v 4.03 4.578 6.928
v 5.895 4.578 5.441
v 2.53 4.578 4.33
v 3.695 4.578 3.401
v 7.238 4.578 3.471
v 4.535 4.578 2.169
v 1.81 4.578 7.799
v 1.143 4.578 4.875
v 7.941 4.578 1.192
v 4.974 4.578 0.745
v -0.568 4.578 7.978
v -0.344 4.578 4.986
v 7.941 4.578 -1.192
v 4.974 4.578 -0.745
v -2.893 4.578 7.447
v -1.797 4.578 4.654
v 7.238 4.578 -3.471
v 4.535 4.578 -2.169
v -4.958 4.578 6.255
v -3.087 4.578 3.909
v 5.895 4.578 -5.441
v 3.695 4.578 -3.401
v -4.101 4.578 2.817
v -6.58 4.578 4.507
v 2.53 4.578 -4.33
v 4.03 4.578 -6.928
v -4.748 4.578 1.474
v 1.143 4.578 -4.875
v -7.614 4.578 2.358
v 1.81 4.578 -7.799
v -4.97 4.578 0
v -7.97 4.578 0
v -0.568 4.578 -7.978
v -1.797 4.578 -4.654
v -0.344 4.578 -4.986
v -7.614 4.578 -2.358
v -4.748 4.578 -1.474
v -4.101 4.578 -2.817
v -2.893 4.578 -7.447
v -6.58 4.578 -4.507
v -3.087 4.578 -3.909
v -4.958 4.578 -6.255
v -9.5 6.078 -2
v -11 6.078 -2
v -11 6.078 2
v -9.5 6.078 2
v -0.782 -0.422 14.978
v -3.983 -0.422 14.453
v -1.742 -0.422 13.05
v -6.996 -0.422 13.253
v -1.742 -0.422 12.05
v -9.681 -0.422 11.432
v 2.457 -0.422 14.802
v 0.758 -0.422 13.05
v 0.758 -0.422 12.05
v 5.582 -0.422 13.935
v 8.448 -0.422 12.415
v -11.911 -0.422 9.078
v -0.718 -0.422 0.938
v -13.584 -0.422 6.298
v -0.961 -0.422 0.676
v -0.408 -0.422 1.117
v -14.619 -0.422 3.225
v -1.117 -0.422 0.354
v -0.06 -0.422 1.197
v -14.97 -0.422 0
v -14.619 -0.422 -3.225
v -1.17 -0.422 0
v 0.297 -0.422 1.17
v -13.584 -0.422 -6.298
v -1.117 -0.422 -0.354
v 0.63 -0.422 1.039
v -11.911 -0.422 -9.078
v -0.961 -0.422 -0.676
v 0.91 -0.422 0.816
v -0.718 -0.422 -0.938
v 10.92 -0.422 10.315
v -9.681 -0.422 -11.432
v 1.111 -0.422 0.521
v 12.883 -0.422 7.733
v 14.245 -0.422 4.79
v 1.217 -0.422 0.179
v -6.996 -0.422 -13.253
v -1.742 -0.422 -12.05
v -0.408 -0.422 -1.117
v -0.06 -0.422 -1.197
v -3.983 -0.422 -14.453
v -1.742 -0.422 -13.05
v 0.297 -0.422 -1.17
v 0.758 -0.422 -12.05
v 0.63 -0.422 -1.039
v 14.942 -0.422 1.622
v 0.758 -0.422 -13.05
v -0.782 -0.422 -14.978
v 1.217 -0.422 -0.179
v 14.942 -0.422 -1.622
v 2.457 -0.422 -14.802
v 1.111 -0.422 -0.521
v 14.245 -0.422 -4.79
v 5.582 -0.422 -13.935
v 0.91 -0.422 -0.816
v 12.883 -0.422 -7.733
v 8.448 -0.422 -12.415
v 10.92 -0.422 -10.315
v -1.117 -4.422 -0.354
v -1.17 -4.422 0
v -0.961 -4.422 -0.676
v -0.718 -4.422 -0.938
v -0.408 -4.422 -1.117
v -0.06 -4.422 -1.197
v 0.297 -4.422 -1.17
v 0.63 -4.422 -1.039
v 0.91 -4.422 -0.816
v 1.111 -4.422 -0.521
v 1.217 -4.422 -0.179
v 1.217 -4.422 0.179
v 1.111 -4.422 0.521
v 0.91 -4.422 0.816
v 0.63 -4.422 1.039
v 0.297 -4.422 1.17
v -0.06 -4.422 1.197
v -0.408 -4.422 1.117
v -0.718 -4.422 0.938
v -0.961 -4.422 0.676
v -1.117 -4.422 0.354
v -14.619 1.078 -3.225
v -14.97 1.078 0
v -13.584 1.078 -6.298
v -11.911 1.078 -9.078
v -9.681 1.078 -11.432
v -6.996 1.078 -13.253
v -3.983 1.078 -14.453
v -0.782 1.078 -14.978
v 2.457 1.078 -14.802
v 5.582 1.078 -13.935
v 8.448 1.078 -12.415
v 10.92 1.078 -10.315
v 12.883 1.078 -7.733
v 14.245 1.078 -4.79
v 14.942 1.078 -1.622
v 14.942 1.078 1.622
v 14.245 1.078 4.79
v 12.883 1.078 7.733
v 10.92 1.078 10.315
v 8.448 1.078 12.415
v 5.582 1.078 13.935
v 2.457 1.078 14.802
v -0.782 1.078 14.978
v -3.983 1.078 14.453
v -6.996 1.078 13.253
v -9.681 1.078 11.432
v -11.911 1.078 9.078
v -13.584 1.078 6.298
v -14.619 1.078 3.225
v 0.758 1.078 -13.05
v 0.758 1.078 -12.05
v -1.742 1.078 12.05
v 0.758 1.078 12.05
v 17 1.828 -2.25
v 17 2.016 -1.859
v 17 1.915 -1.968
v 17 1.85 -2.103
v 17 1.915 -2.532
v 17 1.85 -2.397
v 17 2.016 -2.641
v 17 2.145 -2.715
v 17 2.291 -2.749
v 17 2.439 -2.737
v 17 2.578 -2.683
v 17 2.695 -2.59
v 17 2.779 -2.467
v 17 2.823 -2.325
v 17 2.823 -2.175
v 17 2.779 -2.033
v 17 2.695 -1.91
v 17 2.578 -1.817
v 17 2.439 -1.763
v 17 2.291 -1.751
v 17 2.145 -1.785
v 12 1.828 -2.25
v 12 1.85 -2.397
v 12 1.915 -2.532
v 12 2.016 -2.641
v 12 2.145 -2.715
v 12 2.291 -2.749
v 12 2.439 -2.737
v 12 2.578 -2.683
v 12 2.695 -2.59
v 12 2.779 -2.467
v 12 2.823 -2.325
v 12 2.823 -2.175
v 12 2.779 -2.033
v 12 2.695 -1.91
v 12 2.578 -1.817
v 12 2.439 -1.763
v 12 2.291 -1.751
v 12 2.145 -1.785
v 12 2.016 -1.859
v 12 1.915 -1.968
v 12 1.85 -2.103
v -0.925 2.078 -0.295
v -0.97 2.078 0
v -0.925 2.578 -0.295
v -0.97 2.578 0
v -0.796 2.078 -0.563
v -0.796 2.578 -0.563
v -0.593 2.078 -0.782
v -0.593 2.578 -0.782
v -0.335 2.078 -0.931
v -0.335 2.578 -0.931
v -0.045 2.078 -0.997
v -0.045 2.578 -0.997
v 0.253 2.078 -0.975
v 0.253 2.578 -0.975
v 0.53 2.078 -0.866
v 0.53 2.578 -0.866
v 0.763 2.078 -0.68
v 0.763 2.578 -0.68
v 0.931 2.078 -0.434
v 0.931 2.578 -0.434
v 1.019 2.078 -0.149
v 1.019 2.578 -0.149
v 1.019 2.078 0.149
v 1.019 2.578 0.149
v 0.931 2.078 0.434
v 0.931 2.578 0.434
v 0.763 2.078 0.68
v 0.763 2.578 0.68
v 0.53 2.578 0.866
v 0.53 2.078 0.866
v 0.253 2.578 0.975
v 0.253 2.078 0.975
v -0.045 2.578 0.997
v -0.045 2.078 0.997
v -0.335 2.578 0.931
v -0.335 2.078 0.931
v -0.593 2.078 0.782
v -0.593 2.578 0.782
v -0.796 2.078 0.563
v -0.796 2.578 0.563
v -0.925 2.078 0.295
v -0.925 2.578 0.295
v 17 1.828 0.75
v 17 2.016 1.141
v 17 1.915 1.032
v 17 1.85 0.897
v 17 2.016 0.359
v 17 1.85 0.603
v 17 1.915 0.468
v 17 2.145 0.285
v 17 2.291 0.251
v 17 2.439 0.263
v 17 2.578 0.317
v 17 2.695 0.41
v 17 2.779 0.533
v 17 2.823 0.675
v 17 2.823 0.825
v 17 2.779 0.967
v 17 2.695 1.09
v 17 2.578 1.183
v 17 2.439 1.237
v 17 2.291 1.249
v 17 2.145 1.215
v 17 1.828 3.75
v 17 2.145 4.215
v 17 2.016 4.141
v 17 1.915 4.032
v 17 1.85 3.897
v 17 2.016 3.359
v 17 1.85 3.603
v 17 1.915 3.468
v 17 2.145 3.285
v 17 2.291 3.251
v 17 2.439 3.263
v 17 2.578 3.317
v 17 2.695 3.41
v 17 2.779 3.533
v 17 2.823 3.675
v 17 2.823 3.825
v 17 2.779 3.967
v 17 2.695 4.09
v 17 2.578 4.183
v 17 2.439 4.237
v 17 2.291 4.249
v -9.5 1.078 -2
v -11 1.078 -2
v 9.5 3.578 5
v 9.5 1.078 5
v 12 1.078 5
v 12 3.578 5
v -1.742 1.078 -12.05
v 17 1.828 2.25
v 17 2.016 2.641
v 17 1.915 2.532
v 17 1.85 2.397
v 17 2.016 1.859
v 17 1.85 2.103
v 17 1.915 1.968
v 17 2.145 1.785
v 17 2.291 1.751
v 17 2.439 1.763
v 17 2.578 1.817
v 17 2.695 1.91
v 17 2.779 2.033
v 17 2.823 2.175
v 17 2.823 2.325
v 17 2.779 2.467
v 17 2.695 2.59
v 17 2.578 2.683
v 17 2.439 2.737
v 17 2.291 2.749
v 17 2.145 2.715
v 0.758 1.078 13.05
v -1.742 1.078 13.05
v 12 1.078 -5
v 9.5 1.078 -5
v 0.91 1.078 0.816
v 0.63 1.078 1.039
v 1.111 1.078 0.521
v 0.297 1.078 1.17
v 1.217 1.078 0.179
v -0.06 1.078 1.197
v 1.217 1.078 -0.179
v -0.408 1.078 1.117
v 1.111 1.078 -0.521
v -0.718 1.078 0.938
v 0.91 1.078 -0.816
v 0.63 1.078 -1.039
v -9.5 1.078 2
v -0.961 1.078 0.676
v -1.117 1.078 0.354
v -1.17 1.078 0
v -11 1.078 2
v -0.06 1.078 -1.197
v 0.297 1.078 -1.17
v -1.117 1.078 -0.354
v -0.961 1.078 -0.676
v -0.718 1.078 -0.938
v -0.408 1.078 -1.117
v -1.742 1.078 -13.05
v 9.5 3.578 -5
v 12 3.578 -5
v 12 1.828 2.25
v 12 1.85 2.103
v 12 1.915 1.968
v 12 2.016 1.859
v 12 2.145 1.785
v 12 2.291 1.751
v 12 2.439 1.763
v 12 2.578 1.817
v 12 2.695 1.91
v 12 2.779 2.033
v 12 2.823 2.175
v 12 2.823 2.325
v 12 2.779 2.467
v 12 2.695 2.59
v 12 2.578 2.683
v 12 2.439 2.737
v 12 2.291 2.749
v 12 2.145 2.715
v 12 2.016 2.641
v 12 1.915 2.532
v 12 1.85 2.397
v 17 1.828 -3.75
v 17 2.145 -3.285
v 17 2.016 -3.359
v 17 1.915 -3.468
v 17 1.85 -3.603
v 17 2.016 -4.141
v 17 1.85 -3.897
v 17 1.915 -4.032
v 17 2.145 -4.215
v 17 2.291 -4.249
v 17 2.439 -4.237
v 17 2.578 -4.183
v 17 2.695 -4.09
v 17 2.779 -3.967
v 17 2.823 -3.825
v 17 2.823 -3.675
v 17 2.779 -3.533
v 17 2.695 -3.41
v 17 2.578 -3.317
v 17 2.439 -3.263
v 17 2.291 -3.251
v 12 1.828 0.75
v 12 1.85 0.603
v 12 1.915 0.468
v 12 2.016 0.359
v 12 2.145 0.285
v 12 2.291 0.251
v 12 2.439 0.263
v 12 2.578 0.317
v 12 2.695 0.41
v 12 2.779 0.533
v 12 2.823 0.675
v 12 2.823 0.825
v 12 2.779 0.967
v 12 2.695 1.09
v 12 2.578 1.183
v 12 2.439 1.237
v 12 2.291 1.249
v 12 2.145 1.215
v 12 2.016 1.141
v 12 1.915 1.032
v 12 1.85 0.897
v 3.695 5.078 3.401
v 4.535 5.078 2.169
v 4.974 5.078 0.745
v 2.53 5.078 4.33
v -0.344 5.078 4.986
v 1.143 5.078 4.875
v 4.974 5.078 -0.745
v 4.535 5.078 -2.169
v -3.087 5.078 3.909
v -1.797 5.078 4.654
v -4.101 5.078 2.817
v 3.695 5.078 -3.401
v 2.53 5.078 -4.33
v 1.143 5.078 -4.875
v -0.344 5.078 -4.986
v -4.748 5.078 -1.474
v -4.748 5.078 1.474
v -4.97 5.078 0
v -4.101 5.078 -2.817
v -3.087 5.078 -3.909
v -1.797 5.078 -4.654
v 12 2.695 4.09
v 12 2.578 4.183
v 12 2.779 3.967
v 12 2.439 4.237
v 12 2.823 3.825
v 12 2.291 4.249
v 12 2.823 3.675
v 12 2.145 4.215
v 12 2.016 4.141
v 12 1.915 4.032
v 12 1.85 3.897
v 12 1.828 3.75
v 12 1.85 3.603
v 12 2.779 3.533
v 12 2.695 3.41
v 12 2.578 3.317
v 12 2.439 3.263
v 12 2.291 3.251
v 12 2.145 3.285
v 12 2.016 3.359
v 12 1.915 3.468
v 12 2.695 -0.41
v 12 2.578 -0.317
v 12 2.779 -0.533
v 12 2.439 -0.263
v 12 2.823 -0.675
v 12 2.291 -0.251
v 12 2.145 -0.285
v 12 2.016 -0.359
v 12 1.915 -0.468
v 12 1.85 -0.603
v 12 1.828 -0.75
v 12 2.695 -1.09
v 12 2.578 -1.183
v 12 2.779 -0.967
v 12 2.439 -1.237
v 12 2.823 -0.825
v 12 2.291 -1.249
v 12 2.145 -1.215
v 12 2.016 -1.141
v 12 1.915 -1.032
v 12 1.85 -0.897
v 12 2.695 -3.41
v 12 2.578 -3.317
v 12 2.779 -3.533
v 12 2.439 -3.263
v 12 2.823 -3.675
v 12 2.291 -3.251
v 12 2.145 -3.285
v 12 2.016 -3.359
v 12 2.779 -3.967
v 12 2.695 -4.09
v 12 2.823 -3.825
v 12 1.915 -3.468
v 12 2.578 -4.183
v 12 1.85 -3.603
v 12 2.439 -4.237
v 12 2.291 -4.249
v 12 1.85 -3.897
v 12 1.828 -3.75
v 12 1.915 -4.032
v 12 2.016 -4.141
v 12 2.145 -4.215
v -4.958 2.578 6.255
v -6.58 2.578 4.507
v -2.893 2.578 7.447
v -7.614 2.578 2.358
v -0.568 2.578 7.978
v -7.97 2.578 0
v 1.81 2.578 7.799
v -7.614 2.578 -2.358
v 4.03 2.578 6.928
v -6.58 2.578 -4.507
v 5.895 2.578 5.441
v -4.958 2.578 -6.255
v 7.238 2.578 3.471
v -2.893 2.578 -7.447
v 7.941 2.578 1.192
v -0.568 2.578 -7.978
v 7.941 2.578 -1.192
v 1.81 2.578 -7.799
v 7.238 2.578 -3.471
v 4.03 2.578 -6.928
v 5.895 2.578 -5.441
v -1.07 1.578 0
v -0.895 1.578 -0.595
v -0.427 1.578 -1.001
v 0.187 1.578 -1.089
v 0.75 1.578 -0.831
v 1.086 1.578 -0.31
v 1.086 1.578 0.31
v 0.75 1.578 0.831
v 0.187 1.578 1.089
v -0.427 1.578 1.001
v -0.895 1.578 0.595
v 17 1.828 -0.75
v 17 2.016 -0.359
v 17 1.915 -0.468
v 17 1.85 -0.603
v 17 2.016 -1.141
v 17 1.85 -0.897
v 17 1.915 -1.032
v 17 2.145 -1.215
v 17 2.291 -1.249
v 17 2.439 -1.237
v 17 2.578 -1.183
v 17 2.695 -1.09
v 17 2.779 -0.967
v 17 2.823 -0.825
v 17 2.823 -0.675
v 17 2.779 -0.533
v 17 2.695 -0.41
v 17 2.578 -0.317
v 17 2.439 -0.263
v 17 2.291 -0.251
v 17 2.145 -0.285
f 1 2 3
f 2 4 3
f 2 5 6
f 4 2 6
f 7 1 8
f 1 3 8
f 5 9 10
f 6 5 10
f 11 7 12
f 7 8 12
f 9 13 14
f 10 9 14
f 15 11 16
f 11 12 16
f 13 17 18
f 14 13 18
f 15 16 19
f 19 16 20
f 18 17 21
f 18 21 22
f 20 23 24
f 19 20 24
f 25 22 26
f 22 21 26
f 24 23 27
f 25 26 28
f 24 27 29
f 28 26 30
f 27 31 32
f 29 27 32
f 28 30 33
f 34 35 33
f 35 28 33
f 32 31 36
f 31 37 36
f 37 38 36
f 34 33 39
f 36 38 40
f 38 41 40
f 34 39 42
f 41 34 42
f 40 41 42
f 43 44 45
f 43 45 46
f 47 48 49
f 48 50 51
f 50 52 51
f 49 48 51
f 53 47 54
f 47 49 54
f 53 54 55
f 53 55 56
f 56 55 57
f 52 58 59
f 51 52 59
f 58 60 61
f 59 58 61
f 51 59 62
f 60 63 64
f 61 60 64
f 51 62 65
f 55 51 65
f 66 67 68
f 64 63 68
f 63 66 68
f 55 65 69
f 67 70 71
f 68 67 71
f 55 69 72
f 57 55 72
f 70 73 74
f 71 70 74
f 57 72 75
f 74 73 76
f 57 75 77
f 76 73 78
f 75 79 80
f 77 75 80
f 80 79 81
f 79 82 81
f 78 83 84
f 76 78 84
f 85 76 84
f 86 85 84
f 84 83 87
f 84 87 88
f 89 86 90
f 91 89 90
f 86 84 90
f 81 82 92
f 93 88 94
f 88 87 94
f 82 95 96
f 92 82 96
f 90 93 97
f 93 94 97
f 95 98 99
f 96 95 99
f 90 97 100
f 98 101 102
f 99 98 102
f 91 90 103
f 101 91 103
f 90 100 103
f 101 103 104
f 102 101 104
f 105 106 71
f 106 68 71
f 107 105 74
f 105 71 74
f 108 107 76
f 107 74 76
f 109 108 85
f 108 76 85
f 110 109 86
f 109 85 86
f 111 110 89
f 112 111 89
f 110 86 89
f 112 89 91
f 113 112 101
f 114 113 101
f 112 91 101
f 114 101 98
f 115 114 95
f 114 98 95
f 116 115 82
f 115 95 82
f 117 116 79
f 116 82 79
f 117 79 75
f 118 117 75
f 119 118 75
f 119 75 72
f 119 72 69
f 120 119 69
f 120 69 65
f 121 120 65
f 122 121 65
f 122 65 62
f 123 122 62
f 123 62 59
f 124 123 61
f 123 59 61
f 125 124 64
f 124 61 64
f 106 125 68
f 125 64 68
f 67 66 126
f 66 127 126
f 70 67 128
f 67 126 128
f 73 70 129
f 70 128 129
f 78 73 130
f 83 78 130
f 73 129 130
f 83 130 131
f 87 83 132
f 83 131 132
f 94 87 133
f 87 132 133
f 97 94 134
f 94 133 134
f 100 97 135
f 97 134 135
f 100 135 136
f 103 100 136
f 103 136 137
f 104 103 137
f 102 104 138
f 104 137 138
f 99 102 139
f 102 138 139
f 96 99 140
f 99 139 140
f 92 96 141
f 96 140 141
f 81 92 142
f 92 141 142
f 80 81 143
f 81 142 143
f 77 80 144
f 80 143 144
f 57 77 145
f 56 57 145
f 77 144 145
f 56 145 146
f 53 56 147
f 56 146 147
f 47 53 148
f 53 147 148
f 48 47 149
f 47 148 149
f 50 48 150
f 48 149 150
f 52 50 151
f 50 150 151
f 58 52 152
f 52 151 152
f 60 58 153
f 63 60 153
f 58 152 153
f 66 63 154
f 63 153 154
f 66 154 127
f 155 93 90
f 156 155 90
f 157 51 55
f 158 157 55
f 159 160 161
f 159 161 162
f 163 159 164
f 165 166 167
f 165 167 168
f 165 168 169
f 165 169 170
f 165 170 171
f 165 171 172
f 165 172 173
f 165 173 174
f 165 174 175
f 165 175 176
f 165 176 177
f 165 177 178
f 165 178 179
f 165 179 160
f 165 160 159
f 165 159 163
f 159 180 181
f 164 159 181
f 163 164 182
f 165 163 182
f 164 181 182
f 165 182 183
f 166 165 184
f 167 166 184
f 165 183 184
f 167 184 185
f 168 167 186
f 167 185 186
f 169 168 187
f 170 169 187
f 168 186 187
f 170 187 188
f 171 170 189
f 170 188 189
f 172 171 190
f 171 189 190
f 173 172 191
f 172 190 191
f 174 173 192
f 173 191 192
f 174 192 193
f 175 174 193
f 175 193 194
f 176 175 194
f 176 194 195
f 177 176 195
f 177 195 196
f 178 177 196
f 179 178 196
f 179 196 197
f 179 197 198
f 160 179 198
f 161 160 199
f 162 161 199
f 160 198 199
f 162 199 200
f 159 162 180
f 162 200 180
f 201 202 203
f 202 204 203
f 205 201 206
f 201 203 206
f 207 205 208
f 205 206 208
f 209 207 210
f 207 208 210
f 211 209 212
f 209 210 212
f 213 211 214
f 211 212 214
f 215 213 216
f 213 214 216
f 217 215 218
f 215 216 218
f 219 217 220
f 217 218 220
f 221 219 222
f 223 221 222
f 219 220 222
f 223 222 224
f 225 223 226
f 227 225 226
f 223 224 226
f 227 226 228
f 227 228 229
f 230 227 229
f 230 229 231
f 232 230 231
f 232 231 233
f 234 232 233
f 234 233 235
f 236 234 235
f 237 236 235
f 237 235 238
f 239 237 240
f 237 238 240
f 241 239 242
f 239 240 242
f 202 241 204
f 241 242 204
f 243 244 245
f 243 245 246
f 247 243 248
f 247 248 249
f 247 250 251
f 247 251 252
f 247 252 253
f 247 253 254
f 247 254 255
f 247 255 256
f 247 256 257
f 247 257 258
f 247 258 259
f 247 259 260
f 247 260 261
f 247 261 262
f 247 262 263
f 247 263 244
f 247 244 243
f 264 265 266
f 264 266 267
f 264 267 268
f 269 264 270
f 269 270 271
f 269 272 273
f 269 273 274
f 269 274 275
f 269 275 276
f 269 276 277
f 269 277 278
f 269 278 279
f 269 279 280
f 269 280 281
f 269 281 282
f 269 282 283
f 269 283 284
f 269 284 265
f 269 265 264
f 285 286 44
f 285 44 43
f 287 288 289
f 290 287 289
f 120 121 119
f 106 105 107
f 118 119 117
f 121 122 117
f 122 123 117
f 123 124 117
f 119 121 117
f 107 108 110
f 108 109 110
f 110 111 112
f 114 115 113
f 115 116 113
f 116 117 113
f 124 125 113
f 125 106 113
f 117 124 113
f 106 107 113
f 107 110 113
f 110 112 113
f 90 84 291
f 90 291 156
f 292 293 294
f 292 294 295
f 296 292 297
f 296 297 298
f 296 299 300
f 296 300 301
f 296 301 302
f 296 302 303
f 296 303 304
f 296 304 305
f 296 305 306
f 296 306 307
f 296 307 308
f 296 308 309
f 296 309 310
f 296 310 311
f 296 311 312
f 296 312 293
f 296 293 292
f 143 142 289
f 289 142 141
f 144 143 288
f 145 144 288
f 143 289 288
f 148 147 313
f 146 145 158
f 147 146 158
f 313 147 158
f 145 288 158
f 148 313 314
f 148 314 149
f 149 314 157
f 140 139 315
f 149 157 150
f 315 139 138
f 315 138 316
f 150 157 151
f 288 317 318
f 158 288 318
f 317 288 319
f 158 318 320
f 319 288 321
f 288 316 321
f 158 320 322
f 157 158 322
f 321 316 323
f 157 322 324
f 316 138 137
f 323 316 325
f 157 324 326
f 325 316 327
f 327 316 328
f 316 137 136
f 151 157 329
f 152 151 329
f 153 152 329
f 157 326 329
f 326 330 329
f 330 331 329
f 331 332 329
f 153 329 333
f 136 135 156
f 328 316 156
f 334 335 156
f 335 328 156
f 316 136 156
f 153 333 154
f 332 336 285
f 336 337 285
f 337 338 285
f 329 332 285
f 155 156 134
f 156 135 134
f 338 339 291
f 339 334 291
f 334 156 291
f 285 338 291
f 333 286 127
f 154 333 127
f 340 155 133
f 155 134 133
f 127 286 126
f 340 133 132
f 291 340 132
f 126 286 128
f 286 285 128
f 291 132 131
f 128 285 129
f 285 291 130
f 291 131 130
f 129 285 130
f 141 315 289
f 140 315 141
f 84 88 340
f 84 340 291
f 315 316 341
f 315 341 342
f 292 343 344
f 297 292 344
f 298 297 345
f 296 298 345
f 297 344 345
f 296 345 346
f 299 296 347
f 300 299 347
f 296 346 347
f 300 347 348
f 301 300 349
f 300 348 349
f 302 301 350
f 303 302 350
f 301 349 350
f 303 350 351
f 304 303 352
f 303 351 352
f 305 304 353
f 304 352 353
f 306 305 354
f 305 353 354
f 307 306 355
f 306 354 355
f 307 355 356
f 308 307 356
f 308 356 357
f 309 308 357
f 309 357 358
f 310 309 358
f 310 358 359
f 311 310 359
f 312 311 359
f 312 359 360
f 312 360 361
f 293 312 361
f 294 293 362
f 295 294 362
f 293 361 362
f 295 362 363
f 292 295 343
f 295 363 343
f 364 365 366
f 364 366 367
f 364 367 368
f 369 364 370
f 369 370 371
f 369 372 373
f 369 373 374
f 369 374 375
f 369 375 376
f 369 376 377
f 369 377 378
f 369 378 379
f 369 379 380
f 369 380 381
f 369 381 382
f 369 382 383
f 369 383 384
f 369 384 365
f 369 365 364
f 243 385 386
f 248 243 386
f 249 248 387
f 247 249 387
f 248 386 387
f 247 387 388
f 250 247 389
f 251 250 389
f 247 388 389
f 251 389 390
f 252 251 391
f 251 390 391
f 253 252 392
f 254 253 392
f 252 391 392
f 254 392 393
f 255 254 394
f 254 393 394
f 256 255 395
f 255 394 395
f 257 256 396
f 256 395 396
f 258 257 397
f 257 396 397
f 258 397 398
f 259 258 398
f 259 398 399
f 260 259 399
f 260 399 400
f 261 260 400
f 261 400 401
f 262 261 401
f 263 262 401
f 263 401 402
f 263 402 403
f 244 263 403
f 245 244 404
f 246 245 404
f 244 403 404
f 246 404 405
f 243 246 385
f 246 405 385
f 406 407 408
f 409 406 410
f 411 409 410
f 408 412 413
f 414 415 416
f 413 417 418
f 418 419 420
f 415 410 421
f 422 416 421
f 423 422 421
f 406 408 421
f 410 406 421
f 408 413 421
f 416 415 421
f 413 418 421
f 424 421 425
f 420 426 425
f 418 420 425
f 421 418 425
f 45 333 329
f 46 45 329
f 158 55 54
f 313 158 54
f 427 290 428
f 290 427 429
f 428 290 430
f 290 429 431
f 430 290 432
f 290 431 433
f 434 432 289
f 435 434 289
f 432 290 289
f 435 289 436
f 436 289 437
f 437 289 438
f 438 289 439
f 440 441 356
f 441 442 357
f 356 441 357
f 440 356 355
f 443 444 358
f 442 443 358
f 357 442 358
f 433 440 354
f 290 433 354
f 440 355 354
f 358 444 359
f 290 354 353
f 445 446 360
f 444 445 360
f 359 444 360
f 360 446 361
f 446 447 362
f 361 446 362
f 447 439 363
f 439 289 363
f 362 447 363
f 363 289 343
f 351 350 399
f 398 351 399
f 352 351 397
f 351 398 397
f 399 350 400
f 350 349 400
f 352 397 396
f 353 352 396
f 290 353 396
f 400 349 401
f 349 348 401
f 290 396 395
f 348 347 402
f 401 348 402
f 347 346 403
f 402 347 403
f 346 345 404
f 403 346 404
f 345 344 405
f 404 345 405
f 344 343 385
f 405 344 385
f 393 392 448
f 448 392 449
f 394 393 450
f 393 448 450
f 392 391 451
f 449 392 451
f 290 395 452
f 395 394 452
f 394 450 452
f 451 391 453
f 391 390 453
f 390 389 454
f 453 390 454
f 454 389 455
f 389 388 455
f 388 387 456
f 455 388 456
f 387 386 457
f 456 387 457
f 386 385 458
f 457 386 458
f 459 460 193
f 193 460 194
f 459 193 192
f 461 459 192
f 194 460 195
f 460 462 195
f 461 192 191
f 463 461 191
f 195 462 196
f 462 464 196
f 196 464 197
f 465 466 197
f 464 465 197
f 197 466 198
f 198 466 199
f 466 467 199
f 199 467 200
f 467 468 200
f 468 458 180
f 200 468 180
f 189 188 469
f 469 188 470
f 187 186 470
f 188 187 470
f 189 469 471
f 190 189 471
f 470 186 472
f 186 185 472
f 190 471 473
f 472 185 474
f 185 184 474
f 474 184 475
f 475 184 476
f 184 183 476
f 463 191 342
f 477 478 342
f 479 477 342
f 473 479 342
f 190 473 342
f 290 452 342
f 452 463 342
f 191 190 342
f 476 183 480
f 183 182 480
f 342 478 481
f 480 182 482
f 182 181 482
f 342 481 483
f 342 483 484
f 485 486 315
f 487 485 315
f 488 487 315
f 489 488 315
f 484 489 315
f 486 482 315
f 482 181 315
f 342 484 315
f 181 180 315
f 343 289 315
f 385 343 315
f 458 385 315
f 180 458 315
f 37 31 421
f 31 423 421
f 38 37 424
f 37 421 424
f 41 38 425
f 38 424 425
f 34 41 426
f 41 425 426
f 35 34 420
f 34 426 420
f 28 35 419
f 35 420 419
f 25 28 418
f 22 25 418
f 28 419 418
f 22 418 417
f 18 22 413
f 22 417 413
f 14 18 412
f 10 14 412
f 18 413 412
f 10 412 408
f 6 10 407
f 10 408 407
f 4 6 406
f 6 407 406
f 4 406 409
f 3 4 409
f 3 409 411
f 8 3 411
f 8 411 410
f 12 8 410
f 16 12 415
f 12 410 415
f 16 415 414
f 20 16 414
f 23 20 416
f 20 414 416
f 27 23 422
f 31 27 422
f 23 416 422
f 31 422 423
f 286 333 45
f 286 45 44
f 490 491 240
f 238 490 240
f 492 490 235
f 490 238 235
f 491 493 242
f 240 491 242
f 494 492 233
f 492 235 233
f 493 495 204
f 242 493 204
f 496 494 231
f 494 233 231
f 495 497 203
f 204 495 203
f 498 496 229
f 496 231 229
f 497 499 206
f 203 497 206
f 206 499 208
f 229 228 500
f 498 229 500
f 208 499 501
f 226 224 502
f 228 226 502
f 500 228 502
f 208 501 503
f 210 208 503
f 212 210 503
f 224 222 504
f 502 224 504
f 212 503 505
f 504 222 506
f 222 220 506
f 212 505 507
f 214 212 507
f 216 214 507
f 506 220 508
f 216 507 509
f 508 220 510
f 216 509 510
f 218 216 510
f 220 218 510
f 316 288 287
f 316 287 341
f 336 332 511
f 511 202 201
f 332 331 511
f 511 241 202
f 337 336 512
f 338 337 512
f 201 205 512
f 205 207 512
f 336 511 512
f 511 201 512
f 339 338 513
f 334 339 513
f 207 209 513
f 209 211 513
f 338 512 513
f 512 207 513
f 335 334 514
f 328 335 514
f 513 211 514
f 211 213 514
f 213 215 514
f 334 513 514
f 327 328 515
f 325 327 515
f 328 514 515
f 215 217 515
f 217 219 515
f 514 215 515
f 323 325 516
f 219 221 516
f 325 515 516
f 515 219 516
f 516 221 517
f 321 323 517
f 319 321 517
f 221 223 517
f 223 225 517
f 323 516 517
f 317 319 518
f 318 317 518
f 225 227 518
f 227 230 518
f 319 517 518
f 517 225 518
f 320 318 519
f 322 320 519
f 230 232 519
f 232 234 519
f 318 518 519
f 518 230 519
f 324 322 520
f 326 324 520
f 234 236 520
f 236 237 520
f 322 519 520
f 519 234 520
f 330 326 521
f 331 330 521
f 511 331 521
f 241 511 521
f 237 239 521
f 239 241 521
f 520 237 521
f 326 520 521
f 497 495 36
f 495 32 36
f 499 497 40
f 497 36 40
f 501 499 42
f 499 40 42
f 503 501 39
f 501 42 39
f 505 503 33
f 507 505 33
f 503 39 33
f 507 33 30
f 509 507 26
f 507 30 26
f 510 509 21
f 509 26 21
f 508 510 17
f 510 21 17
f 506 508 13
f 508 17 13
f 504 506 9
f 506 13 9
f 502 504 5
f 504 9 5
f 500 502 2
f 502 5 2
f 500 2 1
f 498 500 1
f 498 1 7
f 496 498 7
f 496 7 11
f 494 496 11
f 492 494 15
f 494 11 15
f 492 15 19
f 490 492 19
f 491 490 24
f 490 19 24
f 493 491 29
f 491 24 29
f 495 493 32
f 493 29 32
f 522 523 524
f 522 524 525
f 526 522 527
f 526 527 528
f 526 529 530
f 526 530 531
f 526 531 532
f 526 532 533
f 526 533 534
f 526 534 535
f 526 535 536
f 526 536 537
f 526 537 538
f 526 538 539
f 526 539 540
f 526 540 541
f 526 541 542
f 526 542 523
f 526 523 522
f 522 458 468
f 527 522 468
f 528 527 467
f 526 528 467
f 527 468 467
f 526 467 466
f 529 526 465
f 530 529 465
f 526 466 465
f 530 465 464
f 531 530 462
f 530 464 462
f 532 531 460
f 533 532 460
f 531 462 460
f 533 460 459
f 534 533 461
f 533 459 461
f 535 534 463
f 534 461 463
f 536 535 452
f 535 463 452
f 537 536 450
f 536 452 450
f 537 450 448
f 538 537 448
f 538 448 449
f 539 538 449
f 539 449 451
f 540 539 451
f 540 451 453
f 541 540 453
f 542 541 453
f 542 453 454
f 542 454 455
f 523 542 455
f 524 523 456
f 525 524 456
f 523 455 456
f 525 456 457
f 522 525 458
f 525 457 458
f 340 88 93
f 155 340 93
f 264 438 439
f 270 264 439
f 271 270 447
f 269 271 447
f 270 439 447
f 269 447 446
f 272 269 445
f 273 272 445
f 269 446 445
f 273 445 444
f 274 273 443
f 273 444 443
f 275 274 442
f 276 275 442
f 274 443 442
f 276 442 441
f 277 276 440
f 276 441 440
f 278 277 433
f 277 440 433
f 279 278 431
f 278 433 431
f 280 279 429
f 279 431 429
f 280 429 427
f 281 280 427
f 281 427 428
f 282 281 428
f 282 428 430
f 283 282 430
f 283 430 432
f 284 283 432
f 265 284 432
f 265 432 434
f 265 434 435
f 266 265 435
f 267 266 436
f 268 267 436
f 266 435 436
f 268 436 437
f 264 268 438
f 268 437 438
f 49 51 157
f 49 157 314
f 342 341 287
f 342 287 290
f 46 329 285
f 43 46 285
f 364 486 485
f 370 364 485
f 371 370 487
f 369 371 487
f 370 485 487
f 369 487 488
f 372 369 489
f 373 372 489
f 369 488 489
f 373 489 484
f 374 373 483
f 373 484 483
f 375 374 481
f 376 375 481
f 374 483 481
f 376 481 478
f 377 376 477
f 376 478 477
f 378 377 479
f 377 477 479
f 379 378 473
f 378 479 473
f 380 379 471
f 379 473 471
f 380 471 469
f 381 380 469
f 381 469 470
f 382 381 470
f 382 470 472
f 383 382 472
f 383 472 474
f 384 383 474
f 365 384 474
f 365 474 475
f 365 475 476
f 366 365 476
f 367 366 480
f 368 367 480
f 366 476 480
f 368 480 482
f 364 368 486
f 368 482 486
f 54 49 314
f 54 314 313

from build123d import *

# Parameters (mm, degrees)
CUT_EXTRUDE1_REACH  = 23.935
SKETCH2_W           = 2.5
SKETCH2_H           = 1
SKETCH3_W           = 1.5
SKETCH3_H           = 4
BOSS_EXTRUDE1_DEPTH = 5
SKETCH3_3_W         = 2.5
SKETCH3_3_H         = 10
BOSS_EXTRUDE2_DEPTH = 2.5
SKETCH5_R           = 0.5
BOSS_EXTRUDE4_DEPTH = 5


with BuildPart() as part:
    # Sketch1 → Revolve1 (revolve)
    with BuildSketch(Plane.XY, mode=Mode.PRIVATE) as revolve1_sk:
        Polygon((0.030129717, -4.421866179), (1.230129717, -4.421866179), (1.230129717, -0.421866179), (15.030129717, -0.421866179), (15.030129717, 1.078133821), (1.230129717, 1.078133821), (1.030129717, 2.078133821), (1.030129717, 2.578133821), (8.030129717, 2.578133821), (8.030129717, 4.578133821), (5.030129717, 4.578133821), (5.030129717, 5.078133821), (0.030129717, 5.078133821), align=None)
    revolve(revolve1_sk.sketch.rotate(Axis((0.030129717, 5.078133821, 0), (0, -1, 0)), 180), axis=Axis((0.030129717, 5.078133821, 0), (0, -1, 0)))

    # Sketch2 → Cut-Extrude1 (cut, up to next)
    with BuildSketch(Plane.XZ.offset(0.421866179), mode=Mode.PRIVATE) as cut_extrude1_sk1:
        with Locations((-0.492014974, -12.55)):
            Rectangle(SKETCH2_W, SKETCH2_H)
    cut_extrude1_tool1 = extrude(cut_extrude1_sk1.sketch, amount=-CUT_EXTRUDE1_REACH, mode=Mode.PRIVATE) & part.part
    # Sketch2 → Cut-Extrude1 (cut, up to next)
    with BuildSketch(Plane.XZ.offset(0.421866179), mode=Mode.PRIVATE) as cut_extrude1_sk2:
        with Locations((-0.492014974, 12.55)):
            Rectangle(SKETCH2_W, SKETCH2_H)
    cut_extrude1_tool2 = extrude(cut_extrude1_sk2.sketch, amount=-CUT_EXTRUDE1_REACH, mode=Mode.PRIVATE) & part.part
    add(cut_extrude1_tool1.solids().sort_by_distance((-0.492015, -0.421866, -12.55))[0], mode=Mode.SUBTRACT)
    add(cut_extrude1_tool2.solids().sort_by_distance((-0.492015, -0.421866, 12.55))[0], mode=Mode.SUBTRACT)

    # Sketch3 → Boss-Extrude1 (add)
    with BuildSketch(Plane(origin=(0, 1.078133821, 0), x_dir=(1, 0, 0), z_dir=(0, 1, 0))):
        with Locations((-10.25, 0)):
            Rectangle(SKETCH3_W, SKETCH3_H)
    extrude(amount=BOSS_EXTRUDE1_DEPTH)

    # Sketch3<3> → Boss-Extrude2 (add)
    with BuildSketch(Plane(origin=(0, 1.078133821, 0), x_dir=(1, 0, 0), z_dir=(0, 1, 0))):
        with Locations((10.75, 0)):
            Rectangle(SKETCH3_3_W, SKETCH3_3_H)
    extrude(amount=BOSS_EXTRUDE2_DEPTH)

    # Sketch5 → Boss-Extrude4 (add)
    with BuildSketch(Plane(origin=(12, 0, 0), x_dir=(0, 0, -1), z_dir=(1, 0, 0))):
        with Locations(Location((-3.75, 2.328133821, 0), (0, 0, 270))):
            Circle(SKETCH5_R)
        with Locations(Location((-2.25, 2.328133821, 0), (0, 0, 270))):
            Circle(SKETCH5_R)
        with Locations(Location((-0.75, 2.328133821, 0), (0, 0, 270))):
            Circle(SKETCH5_R)
        with Locations(Location((0.75, 2.328133821, 0), (0, 0, 270))):
            Circle(SKETCH5_R)
        with Locations(Location((2.25, 2.328133821, 0), (0, 0, 270))):
            Circle(SKETCH5_R)
        with Locations(Location((3.75, 2.328133821, 0), (0, 0, 270))):
            Circle(SKETCH5_R)
    extrude(amount=BOSS_EXTRUDE4_DEPTH)


solid = part.part
